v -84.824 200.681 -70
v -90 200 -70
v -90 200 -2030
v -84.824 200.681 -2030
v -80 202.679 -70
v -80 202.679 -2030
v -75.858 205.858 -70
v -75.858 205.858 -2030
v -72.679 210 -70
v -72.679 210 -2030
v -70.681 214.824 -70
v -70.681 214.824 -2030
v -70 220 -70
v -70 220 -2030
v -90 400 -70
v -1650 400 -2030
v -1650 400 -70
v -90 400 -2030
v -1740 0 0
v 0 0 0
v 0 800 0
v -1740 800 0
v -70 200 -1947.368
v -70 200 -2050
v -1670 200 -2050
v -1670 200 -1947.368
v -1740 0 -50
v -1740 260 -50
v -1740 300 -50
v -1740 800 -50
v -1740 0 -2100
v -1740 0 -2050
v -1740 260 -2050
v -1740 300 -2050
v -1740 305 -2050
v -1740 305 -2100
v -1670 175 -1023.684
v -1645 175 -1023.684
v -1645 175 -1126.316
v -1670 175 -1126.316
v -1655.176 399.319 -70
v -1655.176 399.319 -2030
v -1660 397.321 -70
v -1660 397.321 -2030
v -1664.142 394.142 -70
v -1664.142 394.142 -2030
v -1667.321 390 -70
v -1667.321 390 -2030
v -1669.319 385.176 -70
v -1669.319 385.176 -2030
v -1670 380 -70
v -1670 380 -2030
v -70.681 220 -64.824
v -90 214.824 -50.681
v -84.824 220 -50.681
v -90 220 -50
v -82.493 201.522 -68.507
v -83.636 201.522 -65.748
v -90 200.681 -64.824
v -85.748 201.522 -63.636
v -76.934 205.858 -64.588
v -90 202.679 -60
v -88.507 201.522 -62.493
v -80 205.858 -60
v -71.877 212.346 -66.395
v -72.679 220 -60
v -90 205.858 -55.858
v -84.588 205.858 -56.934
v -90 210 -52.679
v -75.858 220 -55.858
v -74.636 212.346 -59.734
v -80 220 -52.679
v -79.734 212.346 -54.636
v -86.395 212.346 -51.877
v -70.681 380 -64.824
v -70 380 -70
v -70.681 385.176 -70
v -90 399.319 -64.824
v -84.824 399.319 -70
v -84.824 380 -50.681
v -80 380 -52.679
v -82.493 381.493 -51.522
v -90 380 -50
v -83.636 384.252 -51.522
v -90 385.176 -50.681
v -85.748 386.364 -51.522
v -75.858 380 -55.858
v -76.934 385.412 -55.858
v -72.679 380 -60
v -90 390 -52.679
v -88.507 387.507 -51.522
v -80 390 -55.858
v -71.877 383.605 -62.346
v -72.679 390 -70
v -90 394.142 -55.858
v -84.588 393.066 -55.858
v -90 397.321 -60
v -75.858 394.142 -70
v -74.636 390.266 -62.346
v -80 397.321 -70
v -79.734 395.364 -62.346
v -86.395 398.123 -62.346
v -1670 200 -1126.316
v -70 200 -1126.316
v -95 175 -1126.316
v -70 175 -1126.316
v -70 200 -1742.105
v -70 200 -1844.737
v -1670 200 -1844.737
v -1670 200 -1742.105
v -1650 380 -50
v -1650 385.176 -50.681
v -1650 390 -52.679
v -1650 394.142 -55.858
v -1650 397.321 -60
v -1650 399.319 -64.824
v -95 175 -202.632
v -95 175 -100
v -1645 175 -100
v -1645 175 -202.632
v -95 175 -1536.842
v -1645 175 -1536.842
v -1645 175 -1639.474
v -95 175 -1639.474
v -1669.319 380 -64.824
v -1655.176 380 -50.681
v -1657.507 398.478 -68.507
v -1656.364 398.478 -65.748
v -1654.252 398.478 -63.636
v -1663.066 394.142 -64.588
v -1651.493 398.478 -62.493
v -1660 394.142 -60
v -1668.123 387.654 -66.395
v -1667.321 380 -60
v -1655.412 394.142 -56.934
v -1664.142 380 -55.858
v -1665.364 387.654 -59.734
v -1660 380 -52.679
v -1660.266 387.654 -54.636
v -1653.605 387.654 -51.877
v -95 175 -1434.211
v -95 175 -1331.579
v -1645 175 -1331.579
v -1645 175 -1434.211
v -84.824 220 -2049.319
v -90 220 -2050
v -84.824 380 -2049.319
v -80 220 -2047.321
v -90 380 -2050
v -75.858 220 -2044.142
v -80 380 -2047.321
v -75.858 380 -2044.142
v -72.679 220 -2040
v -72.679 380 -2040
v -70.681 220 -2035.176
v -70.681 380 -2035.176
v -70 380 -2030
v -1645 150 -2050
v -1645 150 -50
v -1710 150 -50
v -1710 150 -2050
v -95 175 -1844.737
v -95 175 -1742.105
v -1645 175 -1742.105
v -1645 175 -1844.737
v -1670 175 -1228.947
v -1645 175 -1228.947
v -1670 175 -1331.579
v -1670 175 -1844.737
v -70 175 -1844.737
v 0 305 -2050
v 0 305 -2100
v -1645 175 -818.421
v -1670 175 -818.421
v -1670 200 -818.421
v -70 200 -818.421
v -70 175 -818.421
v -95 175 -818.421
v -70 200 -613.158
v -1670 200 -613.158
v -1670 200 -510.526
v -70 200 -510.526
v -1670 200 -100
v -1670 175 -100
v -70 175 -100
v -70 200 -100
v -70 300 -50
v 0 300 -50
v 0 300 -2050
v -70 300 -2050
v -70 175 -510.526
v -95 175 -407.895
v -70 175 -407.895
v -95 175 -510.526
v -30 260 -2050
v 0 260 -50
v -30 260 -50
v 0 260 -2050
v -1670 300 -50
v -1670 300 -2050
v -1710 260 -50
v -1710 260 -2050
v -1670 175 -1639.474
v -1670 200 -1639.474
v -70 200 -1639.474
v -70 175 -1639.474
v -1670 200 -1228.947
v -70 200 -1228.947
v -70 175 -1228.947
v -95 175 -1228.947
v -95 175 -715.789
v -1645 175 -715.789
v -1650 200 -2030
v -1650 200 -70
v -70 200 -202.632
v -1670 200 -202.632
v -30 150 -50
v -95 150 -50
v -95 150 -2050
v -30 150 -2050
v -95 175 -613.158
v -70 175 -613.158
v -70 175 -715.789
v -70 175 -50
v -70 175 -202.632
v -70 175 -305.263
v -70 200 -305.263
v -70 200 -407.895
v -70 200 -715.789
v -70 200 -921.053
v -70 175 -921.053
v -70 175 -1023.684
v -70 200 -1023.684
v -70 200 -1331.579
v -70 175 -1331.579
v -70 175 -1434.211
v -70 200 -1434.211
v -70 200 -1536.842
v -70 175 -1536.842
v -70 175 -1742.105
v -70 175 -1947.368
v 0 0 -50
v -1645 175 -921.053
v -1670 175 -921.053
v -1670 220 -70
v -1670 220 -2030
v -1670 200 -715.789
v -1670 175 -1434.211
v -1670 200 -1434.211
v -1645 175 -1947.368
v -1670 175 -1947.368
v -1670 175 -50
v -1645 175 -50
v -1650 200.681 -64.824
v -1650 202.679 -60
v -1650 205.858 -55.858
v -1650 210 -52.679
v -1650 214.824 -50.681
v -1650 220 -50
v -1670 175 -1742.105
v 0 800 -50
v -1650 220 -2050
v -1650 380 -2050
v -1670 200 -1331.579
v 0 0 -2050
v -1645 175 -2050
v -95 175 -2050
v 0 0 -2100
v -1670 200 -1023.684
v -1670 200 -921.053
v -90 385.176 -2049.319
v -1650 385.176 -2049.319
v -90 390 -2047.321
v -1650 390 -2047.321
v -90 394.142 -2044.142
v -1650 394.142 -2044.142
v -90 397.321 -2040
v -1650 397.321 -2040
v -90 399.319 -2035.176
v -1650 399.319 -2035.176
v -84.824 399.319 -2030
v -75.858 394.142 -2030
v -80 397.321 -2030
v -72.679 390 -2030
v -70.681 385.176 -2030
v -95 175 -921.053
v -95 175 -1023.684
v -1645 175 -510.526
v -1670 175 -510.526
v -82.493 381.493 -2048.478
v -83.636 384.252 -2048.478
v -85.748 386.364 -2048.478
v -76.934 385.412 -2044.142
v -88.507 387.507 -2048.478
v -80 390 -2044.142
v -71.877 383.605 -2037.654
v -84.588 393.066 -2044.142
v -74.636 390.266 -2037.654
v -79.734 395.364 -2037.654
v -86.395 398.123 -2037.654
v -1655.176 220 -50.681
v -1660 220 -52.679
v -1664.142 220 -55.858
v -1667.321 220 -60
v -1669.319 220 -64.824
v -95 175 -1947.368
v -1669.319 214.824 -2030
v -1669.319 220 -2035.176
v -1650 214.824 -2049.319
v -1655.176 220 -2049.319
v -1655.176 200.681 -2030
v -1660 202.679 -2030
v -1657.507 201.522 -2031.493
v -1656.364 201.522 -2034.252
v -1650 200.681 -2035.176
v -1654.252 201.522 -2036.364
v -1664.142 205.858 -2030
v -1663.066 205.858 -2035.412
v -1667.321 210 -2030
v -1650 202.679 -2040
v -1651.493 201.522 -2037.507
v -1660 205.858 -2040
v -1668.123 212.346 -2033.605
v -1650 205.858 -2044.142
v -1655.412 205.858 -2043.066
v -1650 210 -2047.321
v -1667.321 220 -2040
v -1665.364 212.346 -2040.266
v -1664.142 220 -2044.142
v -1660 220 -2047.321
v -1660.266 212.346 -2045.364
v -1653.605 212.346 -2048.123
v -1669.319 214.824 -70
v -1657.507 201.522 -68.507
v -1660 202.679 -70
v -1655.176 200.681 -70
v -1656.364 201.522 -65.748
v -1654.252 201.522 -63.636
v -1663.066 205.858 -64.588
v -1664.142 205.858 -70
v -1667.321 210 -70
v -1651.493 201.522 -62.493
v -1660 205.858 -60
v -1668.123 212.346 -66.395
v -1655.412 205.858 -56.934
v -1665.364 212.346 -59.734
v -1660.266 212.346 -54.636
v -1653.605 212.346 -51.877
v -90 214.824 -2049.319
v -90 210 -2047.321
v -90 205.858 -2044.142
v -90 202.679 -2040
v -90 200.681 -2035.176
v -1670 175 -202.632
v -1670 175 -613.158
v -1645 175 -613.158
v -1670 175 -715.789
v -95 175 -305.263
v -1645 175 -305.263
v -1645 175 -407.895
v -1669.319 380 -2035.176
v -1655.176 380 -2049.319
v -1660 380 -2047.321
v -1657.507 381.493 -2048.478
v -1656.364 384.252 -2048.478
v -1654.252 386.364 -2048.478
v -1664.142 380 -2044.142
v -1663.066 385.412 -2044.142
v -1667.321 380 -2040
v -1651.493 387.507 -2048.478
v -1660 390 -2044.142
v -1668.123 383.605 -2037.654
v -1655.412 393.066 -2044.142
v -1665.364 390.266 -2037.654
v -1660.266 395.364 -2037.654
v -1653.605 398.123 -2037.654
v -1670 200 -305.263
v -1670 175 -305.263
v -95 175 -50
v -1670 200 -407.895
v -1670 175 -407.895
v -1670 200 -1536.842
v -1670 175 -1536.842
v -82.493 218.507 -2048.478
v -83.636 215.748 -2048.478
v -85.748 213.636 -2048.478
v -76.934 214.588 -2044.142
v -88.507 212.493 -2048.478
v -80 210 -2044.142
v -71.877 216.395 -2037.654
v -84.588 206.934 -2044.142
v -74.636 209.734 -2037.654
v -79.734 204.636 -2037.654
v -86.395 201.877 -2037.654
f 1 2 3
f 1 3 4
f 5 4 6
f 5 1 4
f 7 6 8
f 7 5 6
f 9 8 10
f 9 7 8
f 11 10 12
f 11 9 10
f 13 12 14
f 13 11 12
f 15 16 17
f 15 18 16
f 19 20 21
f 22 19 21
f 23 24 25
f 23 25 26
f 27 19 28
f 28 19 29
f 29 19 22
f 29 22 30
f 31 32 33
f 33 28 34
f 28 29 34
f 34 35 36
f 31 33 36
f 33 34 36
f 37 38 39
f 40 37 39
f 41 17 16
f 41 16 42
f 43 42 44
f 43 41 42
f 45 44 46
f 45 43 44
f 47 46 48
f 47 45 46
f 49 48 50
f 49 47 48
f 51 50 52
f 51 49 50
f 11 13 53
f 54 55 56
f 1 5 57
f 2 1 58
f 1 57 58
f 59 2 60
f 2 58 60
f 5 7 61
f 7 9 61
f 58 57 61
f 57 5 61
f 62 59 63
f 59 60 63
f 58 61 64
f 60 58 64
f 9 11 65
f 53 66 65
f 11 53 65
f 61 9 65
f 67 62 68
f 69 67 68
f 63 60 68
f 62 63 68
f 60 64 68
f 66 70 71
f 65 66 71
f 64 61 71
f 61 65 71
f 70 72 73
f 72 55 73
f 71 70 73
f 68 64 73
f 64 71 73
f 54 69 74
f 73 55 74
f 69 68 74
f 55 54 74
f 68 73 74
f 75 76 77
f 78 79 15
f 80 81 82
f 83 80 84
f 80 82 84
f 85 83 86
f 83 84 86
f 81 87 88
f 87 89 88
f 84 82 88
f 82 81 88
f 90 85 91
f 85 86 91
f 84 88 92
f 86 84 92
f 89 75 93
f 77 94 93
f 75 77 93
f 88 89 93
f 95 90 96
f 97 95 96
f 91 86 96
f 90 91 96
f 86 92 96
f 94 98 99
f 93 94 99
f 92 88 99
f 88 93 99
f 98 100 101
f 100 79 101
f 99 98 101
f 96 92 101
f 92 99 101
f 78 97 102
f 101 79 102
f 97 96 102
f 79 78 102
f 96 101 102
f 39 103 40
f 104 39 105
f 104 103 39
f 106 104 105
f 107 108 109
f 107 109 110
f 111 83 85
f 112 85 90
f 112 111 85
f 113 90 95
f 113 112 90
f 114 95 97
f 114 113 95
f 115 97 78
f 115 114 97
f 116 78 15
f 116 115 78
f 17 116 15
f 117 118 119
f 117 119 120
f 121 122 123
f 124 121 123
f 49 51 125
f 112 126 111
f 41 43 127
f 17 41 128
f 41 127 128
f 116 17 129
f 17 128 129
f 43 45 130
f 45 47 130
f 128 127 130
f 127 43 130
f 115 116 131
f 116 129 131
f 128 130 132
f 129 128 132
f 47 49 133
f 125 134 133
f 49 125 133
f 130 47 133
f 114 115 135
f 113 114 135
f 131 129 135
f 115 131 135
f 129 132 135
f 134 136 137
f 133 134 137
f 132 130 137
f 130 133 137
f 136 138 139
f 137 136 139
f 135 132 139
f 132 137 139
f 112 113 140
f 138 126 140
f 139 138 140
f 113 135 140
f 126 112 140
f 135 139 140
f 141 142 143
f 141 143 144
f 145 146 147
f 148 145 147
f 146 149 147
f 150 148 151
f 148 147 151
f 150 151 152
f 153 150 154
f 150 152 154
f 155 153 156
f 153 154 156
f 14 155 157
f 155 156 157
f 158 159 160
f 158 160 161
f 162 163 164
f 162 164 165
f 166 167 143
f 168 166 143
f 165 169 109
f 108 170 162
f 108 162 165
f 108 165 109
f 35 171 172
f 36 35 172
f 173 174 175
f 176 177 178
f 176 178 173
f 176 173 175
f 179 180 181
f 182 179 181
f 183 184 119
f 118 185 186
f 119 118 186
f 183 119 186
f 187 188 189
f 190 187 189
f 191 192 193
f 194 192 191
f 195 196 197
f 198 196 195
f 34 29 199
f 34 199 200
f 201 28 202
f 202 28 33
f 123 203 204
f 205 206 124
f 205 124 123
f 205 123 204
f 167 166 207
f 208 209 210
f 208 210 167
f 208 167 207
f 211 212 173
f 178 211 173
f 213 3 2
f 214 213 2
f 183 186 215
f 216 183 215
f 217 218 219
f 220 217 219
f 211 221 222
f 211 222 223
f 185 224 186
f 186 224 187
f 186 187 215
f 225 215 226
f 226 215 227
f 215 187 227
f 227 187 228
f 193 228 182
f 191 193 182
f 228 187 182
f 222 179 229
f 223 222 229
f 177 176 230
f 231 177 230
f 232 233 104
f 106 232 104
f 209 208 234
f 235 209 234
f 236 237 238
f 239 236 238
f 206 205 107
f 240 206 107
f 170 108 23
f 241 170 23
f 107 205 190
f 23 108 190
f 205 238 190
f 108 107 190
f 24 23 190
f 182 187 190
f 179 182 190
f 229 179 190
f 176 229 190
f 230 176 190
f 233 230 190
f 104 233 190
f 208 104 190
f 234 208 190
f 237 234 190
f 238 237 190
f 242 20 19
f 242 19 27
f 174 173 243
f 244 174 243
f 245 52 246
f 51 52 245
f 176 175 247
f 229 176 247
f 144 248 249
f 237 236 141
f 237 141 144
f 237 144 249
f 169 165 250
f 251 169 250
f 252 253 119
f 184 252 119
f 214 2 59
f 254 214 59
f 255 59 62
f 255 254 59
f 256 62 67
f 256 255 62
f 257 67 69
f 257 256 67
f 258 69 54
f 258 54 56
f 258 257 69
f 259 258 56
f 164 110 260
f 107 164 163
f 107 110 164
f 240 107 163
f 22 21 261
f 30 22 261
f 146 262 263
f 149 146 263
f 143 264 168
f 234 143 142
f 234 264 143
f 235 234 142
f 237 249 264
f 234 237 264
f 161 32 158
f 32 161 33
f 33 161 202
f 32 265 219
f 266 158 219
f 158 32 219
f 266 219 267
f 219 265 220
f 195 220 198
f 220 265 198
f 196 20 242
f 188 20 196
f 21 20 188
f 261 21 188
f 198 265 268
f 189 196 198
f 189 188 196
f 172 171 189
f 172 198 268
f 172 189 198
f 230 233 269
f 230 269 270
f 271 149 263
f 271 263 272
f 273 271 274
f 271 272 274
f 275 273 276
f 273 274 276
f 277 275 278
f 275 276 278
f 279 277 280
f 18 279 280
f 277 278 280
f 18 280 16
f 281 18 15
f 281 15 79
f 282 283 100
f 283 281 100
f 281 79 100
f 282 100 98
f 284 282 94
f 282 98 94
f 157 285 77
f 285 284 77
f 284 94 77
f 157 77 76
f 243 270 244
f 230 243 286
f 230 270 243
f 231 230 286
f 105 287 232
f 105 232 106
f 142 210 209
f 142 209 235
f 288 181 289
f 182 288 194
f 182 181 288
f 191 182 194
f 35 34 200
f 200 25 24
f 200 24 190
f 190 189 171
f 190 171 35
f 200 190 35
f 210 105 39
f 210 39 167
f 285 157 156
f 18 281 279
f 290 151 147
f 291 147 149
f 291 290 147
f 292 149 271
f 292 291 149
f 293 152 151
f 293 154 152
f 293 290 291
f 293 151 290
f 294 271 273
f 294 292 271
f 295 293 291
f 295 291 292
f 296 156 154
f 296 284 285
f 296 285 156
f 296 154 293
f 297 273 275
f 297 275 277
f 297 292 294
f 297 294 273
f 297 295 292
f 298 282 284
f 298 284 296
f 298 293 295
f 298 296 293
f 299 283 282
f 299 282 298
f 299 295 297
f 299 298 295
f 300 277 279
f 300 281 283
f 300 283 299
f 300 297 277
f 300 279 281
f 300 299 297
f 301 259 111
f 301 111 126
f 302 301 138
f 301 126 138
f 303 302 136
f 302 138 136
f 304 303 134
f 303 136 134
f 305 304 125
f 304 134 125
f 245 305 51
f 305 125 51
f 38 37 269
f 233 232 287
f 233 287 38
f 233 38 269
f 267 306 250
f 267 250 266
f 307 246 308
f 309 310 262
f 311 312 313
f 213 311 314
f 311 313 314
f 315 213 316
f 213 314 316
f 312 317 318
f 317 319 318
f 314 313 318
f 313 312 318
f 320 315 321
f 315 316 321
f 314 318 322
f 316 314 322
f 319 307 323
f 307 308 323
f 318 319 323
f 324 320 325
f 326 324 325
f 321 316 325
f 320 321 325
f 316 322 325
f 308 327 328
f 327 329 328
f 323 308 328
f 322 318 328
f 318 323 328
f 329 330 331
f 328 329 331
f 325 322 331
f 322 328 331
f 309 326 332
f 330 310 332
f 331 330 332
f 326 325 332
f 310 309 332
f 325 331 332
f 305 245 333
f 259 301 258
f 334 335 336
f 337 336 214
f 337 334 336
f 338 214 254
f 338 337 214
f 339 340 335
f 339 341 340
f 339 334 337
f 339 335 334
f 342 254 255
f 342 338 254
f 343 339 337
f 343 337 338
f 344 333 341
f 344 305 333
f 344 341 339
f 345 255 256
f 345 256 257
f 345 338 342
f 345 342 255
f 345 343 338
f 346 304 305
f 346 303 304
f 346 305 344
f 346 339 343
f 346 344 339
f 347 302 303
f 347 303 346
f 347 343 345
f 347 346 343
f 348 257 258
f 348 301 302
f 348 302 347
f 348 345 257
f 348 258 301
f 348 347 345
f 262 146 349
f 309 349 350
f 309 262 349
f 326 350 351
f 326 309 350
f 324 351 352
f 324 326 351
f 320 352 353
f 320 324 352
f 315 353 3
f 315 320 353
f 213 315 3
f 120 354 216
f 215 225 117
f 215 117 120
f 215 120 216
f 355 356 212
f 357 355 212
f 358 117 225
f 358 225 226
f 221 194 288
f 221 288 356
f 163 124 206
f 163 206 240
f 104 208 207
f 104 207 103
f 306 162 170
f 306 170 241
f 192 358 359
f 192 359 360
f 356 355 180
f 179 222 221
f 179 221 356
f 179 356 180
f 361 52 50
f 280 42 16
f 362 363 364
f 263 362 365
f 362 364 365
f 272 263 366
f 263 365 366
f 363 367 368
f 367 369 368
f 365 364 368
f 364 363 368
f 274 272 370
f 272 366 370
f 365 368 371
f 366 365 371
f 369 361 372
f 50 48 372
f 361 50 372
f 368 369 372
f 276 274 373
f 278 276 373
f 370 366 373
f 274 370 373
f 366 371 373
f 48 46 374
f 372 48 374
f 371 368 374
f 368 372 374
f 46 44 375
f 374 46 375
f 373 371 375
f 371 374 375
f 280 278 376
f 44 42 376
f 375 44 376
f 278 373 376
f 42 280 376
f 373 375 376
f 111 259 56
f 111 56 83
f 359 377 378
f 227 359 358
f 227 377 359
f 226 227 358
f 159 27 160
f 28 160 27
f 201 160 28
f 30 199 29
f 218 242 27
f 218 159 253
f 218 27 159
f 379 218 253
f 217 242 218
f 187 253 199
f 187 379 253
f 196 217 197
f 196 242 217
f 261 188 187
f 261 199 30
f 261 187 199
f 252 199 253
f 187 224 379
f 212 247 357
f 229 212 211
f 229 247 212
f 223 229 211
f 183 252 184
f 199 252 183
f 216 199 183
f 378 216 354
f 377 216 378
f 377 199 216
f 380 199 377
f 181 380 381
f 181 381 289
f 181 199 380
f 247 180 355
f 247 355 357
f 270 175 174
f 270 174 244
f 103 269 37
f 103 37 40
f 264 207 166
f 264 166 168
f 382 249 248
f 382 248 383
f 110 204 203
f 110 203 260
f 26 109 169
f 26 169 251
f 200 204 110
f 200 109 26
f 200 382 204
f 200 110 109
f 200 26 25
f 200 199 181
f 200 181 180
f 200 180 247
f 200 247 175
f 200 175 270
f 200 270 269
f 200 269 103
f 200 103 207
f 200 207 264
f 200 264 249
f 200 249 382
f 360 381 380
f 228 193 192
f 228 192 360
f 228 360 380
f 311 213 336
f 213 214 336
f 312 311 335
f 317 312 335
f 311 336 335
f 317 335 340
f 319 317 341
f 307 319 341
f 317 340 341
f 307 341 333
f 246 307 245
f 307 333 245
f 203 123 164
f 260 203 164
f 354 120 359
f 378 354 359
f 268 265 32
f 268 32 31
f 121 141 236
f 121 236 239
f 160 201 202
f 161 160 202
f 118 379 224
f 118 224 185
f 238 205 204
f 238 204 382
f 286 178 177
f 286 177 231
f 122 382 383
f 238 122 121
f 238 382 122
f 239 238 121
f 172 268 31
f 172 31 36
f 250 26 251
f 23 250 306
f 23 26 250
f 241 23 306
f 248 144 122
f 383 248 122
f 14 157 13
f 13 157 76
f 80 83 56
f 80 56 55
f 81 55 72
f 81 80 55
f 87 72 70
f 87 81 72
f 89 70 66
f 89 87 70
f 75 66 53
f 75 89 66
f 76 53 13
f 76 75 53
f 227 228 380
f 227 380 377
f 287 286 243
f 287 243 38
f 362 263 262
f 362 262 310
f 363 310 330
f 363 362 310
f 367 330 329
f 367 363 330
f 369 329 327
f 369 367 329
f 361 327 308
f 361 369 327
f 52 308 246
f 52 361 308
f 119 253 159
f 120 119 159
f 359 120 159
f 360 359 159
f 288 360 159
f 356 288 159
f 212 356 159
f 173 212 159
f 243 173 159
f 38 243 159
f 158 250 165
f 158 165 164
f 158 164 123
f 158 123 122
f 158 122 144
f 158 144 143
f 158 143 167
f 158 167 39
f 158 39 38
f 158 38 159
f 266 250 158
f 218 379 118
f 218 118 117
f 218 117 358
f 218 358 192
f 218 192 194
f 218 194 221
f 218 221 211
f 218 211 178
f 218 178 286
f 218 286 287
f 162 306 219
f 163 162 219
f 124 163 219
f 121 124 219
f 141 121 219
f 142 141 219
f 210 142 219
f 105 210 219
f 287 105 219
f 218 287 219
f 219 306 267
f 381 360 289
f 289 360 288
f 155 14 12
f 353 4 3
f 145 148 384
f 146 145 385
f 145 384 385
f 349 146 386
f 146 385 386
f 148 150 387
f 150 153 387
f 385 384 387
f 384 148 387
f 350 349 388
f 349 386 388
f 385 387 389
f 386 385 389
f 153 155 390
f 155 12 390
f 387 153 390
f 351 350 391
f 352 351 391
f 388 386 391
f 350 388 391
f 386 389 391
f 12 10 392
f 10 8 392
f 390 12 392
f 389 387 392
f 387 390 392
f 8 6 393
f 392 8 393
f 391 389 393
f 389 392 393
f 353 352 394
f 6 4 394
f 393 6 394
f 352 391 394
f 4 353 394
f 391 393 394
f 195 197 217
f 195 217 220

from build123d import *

# Parameters (mm, degrees)
BEDSKETCH_W                        = 50
BEDSKETCH_H                        = 800
BEDHEADERSBOSS_EXTRUDE_DEPTH       = 1740
BEDSKETCH_H_2                      = 305
BEDHEADERSBOSS_EXTRUDE_2_DEPTH     = 1740
BEAMEXTRUDE_THIN_START             = -30
BEDSKETCH_7_W                      = 2000
BEDSKETCH_7_H                      = 150
BEAMEXTRUDE_THIN_DEPTH             = 40
BEDSKETCH_8_W                      = 2000
BEDSKETCH_8_H                      = 40
BEAMTOPEXTRUDE_THIN_DEPTH          = 40
SLATESUPPORTEXTRUDE_THIN_START     = -95
SLATESUPPORTEXTRUDE_THIN_OUTLINE_W = 2000
SLATESUPPORTEXTRUDE_THIN_OUTLINE_H = 25
SLATESUPPORTEXTRUDE_THIN_DEPTH     = 25
SLATESBOSS_EXTRUDE_START           = -70
BEDSKETCH_11_W                     = 102.631578947
BEDSKETCH_11_H                     = 25
SLATESBOSS_EXTRUDE_DEPTH           = 1600
MATTRESSSKETCH_W                   = 2000
MATTRESSSKETCH_H                   = 200
MATTRESSBOSS_EXTRUDE_DEPTH         = 1600
MATTRESSFILLET_R                   = 20


# Read off the part's stored shape, not the designer's step: SlateSupportExtrude-Thin
with BuildPart() as part:
    # BedSketch → BedHeadersBoss-Extrude (new body)
    with BuildSketch(Plane(origin=(0, 0, 0), x_dir=(0, 0, -1), z_dir=(1, 0, 0))):
        with Locations((25, 400)):
            Rectangle(BEDSKETCH_W, BEDSKETCH_H)
    extrude(amount=-BEDHEADERSBOSS_EXTRUDE_DEPTH)



with BuildPart() as body_2:
    # BedSketch → BedHeadersBoss-Extrude 2 (new body)
    with BuildSketch(Plane(origin=(0, 0, 0), x_dir=(0, 0, -1), z_dir=(1, 0, 0))):
        with Locations((2075, 152.5)):
            Rectangle(BEDSKETCH_W, BEDSKETCH_H_2)
    extrude(amount=-BEDHEADERSBOSS_EXTRUDE_2_DEPTH)


with BuildPart() as body_3:
    # BedSketch<7> → BeamExtrude-Thin (new body)
    with BuildSketch(Plane(origin=(0, 0, 0), x_dir=(0, 0, -1), z_dir=(1, 0, 0)).offset(BEAMEXTRUDE_THIN_START)):
        with Locations((1050, 225)):
            Rectangle(BEDSKETCH_7_W, BEDSKETCH_7_H)
    extrude(amount=-BEAMEXTRUDE_THIN_DEPTH)

    # BedSketch<8> → BeamTopExtrude-Thin (add)
    with BuildSketch(Plane(origin=(0, 0, 0), x_dir=(0, 0, -1), z_dir=(1, 0, 0))):
        with Locations((1050, 280)):
            Rectangle(BEDSKETCH_8_W, BEDSKETCH_8_H)
    extrude(amount=-BEAMTOPEXTRUDE_THIN_DEPTH)


with BuildPart() as part_1:
    add(part.part)

    add(body_2.part)  # SlateSupportExtrude-Thin merges body 2

    add(body_3.part)  # SlateSupportExtrude-Thin merges body 3
    # SlateSupportExtrude-Thin outline → SlateSupportExtrude-Thin (add)
    with BuildSketch(Plane(origin=(0, 0, 0), x_dir=(0, 0, -1), z_dir=(1, 0, 0)).offset(SLATESUPPORTEXTRUDE_THIN_START)):
        with Locations((1050, 162.5)):
            Rectangle(SLATESUPPORTEXTRUDE_THIN_OUTLINE_W, SLATESUPPORTEXTRUDE_THIN_OUTLINE_H)
    extrude(amount=SLATESUPPORTEXTRUDE_THIN_DEPTH)

    # BeamMirror: part across plane


with BuildPart() as part_2:
    add(part_1.part)
    add(part_1.part.mirror(Plane(origin=(-870, 0, 0), x_dir=(0, 0, 1), z_dir=(1, 0, 0))))

    # BedSketch<11> → SlatesBoss-Extrude (add)
    with BuildSketch(Plane(origin=(0, 0, 0), x_dir=(0, 0, -1), z_dir=(1, 0, 0)).offset(SLATESBOSS_EXTRUDE_START)):
        with Locations((151.315789473, 187.5)):
            Rectangle(BEDSKETCH_11_W, BEDSKETCH_11_H)
        Polygon((305.263157895, 200), (305.263157895, 175), (407.894736842, 175), (407.894736842, 200), (357.894736842, 200), align=None)
        Polygon((510.526315789, 200), (510.526315789, 175), (613.157894737, 175), (613.157894737, 200), (563.157894737, 200), align=None)
        Polygon((715.789473684, 200), (715.789473684, 175), (818.421052632, 175), (818.421052632, 200), (768.421052632, 200), align=None)
        Polygon((921.052631579, 200), (921.052631579, 175), (1023.684210526, 175), (1023.684210526, 200), (973.684210526, 200), align=None)
        Polygon((1126.315789474, 200), (1126.315789474, 175), (1228.947368421, 175), (1228.947368421, 200), (1178.947368421, 200), align=None)
        Polygon((1331.578947368, 175), (1434.210526316, 175), (1434.210526316, 200), (1384.210526316, 200), (1331.578947368, 200), align=None)
        Polygon((1536.842105263, 175), (1639.473684211, 175), (1639.473684211, 200), (1589.473684211, 200), (1536.842105263, 200), align=None)
        Polygon((1742.105263158, 175), (1844.736842105, 175), (1844.736842105, 200), (1794.736842105, 200), (1742.105263158, 200), align=None)
        Polygon((2050, 175), (2050, 200), (2000, 200), (1947.368421053, 200), (1947.368421053, 175), align=None)
    extrude(amount=-SLATESBOSS_EXTRUDE_DEPTH)


with BuildPart() as body_2_2:
    # MattressSketch → MattressBoss-Extrude (new body)
    with BuildSketch(Plane.ZY.offset(70)):
        with Locations((-1050, 300)):
            Rectangle(MATTRESSSKETCH_W, MATTRESSSKETCH_H)
    extrude(amount=MATTRESSBOSS_EXTRUDE_DEPTH)

    # MattressFillet
    mattressfillet_edges = [body_2_2.edges().sort_by_distance(p)[0] for p in [
        (-1670, 300, -50),
        (-1670, 400, -1050),
        (-1670, 300, -2050),
        (-70, 400, -1050),
        (-70, 300, -50),
        (-70, 200, -1050),
        (-70, 300, -2050),
        (-1670, 200, -1050),
        (-870, 400, -2050),
        (-870, 400, -50),
        (-870, 200, -50),
        (-870, 200, -2050),
    ]]
    fillet(mattressfillet_edges, radius=MATTRESSFILLET_R)


solid = Compound([part_2.part, body_2_2.part])
